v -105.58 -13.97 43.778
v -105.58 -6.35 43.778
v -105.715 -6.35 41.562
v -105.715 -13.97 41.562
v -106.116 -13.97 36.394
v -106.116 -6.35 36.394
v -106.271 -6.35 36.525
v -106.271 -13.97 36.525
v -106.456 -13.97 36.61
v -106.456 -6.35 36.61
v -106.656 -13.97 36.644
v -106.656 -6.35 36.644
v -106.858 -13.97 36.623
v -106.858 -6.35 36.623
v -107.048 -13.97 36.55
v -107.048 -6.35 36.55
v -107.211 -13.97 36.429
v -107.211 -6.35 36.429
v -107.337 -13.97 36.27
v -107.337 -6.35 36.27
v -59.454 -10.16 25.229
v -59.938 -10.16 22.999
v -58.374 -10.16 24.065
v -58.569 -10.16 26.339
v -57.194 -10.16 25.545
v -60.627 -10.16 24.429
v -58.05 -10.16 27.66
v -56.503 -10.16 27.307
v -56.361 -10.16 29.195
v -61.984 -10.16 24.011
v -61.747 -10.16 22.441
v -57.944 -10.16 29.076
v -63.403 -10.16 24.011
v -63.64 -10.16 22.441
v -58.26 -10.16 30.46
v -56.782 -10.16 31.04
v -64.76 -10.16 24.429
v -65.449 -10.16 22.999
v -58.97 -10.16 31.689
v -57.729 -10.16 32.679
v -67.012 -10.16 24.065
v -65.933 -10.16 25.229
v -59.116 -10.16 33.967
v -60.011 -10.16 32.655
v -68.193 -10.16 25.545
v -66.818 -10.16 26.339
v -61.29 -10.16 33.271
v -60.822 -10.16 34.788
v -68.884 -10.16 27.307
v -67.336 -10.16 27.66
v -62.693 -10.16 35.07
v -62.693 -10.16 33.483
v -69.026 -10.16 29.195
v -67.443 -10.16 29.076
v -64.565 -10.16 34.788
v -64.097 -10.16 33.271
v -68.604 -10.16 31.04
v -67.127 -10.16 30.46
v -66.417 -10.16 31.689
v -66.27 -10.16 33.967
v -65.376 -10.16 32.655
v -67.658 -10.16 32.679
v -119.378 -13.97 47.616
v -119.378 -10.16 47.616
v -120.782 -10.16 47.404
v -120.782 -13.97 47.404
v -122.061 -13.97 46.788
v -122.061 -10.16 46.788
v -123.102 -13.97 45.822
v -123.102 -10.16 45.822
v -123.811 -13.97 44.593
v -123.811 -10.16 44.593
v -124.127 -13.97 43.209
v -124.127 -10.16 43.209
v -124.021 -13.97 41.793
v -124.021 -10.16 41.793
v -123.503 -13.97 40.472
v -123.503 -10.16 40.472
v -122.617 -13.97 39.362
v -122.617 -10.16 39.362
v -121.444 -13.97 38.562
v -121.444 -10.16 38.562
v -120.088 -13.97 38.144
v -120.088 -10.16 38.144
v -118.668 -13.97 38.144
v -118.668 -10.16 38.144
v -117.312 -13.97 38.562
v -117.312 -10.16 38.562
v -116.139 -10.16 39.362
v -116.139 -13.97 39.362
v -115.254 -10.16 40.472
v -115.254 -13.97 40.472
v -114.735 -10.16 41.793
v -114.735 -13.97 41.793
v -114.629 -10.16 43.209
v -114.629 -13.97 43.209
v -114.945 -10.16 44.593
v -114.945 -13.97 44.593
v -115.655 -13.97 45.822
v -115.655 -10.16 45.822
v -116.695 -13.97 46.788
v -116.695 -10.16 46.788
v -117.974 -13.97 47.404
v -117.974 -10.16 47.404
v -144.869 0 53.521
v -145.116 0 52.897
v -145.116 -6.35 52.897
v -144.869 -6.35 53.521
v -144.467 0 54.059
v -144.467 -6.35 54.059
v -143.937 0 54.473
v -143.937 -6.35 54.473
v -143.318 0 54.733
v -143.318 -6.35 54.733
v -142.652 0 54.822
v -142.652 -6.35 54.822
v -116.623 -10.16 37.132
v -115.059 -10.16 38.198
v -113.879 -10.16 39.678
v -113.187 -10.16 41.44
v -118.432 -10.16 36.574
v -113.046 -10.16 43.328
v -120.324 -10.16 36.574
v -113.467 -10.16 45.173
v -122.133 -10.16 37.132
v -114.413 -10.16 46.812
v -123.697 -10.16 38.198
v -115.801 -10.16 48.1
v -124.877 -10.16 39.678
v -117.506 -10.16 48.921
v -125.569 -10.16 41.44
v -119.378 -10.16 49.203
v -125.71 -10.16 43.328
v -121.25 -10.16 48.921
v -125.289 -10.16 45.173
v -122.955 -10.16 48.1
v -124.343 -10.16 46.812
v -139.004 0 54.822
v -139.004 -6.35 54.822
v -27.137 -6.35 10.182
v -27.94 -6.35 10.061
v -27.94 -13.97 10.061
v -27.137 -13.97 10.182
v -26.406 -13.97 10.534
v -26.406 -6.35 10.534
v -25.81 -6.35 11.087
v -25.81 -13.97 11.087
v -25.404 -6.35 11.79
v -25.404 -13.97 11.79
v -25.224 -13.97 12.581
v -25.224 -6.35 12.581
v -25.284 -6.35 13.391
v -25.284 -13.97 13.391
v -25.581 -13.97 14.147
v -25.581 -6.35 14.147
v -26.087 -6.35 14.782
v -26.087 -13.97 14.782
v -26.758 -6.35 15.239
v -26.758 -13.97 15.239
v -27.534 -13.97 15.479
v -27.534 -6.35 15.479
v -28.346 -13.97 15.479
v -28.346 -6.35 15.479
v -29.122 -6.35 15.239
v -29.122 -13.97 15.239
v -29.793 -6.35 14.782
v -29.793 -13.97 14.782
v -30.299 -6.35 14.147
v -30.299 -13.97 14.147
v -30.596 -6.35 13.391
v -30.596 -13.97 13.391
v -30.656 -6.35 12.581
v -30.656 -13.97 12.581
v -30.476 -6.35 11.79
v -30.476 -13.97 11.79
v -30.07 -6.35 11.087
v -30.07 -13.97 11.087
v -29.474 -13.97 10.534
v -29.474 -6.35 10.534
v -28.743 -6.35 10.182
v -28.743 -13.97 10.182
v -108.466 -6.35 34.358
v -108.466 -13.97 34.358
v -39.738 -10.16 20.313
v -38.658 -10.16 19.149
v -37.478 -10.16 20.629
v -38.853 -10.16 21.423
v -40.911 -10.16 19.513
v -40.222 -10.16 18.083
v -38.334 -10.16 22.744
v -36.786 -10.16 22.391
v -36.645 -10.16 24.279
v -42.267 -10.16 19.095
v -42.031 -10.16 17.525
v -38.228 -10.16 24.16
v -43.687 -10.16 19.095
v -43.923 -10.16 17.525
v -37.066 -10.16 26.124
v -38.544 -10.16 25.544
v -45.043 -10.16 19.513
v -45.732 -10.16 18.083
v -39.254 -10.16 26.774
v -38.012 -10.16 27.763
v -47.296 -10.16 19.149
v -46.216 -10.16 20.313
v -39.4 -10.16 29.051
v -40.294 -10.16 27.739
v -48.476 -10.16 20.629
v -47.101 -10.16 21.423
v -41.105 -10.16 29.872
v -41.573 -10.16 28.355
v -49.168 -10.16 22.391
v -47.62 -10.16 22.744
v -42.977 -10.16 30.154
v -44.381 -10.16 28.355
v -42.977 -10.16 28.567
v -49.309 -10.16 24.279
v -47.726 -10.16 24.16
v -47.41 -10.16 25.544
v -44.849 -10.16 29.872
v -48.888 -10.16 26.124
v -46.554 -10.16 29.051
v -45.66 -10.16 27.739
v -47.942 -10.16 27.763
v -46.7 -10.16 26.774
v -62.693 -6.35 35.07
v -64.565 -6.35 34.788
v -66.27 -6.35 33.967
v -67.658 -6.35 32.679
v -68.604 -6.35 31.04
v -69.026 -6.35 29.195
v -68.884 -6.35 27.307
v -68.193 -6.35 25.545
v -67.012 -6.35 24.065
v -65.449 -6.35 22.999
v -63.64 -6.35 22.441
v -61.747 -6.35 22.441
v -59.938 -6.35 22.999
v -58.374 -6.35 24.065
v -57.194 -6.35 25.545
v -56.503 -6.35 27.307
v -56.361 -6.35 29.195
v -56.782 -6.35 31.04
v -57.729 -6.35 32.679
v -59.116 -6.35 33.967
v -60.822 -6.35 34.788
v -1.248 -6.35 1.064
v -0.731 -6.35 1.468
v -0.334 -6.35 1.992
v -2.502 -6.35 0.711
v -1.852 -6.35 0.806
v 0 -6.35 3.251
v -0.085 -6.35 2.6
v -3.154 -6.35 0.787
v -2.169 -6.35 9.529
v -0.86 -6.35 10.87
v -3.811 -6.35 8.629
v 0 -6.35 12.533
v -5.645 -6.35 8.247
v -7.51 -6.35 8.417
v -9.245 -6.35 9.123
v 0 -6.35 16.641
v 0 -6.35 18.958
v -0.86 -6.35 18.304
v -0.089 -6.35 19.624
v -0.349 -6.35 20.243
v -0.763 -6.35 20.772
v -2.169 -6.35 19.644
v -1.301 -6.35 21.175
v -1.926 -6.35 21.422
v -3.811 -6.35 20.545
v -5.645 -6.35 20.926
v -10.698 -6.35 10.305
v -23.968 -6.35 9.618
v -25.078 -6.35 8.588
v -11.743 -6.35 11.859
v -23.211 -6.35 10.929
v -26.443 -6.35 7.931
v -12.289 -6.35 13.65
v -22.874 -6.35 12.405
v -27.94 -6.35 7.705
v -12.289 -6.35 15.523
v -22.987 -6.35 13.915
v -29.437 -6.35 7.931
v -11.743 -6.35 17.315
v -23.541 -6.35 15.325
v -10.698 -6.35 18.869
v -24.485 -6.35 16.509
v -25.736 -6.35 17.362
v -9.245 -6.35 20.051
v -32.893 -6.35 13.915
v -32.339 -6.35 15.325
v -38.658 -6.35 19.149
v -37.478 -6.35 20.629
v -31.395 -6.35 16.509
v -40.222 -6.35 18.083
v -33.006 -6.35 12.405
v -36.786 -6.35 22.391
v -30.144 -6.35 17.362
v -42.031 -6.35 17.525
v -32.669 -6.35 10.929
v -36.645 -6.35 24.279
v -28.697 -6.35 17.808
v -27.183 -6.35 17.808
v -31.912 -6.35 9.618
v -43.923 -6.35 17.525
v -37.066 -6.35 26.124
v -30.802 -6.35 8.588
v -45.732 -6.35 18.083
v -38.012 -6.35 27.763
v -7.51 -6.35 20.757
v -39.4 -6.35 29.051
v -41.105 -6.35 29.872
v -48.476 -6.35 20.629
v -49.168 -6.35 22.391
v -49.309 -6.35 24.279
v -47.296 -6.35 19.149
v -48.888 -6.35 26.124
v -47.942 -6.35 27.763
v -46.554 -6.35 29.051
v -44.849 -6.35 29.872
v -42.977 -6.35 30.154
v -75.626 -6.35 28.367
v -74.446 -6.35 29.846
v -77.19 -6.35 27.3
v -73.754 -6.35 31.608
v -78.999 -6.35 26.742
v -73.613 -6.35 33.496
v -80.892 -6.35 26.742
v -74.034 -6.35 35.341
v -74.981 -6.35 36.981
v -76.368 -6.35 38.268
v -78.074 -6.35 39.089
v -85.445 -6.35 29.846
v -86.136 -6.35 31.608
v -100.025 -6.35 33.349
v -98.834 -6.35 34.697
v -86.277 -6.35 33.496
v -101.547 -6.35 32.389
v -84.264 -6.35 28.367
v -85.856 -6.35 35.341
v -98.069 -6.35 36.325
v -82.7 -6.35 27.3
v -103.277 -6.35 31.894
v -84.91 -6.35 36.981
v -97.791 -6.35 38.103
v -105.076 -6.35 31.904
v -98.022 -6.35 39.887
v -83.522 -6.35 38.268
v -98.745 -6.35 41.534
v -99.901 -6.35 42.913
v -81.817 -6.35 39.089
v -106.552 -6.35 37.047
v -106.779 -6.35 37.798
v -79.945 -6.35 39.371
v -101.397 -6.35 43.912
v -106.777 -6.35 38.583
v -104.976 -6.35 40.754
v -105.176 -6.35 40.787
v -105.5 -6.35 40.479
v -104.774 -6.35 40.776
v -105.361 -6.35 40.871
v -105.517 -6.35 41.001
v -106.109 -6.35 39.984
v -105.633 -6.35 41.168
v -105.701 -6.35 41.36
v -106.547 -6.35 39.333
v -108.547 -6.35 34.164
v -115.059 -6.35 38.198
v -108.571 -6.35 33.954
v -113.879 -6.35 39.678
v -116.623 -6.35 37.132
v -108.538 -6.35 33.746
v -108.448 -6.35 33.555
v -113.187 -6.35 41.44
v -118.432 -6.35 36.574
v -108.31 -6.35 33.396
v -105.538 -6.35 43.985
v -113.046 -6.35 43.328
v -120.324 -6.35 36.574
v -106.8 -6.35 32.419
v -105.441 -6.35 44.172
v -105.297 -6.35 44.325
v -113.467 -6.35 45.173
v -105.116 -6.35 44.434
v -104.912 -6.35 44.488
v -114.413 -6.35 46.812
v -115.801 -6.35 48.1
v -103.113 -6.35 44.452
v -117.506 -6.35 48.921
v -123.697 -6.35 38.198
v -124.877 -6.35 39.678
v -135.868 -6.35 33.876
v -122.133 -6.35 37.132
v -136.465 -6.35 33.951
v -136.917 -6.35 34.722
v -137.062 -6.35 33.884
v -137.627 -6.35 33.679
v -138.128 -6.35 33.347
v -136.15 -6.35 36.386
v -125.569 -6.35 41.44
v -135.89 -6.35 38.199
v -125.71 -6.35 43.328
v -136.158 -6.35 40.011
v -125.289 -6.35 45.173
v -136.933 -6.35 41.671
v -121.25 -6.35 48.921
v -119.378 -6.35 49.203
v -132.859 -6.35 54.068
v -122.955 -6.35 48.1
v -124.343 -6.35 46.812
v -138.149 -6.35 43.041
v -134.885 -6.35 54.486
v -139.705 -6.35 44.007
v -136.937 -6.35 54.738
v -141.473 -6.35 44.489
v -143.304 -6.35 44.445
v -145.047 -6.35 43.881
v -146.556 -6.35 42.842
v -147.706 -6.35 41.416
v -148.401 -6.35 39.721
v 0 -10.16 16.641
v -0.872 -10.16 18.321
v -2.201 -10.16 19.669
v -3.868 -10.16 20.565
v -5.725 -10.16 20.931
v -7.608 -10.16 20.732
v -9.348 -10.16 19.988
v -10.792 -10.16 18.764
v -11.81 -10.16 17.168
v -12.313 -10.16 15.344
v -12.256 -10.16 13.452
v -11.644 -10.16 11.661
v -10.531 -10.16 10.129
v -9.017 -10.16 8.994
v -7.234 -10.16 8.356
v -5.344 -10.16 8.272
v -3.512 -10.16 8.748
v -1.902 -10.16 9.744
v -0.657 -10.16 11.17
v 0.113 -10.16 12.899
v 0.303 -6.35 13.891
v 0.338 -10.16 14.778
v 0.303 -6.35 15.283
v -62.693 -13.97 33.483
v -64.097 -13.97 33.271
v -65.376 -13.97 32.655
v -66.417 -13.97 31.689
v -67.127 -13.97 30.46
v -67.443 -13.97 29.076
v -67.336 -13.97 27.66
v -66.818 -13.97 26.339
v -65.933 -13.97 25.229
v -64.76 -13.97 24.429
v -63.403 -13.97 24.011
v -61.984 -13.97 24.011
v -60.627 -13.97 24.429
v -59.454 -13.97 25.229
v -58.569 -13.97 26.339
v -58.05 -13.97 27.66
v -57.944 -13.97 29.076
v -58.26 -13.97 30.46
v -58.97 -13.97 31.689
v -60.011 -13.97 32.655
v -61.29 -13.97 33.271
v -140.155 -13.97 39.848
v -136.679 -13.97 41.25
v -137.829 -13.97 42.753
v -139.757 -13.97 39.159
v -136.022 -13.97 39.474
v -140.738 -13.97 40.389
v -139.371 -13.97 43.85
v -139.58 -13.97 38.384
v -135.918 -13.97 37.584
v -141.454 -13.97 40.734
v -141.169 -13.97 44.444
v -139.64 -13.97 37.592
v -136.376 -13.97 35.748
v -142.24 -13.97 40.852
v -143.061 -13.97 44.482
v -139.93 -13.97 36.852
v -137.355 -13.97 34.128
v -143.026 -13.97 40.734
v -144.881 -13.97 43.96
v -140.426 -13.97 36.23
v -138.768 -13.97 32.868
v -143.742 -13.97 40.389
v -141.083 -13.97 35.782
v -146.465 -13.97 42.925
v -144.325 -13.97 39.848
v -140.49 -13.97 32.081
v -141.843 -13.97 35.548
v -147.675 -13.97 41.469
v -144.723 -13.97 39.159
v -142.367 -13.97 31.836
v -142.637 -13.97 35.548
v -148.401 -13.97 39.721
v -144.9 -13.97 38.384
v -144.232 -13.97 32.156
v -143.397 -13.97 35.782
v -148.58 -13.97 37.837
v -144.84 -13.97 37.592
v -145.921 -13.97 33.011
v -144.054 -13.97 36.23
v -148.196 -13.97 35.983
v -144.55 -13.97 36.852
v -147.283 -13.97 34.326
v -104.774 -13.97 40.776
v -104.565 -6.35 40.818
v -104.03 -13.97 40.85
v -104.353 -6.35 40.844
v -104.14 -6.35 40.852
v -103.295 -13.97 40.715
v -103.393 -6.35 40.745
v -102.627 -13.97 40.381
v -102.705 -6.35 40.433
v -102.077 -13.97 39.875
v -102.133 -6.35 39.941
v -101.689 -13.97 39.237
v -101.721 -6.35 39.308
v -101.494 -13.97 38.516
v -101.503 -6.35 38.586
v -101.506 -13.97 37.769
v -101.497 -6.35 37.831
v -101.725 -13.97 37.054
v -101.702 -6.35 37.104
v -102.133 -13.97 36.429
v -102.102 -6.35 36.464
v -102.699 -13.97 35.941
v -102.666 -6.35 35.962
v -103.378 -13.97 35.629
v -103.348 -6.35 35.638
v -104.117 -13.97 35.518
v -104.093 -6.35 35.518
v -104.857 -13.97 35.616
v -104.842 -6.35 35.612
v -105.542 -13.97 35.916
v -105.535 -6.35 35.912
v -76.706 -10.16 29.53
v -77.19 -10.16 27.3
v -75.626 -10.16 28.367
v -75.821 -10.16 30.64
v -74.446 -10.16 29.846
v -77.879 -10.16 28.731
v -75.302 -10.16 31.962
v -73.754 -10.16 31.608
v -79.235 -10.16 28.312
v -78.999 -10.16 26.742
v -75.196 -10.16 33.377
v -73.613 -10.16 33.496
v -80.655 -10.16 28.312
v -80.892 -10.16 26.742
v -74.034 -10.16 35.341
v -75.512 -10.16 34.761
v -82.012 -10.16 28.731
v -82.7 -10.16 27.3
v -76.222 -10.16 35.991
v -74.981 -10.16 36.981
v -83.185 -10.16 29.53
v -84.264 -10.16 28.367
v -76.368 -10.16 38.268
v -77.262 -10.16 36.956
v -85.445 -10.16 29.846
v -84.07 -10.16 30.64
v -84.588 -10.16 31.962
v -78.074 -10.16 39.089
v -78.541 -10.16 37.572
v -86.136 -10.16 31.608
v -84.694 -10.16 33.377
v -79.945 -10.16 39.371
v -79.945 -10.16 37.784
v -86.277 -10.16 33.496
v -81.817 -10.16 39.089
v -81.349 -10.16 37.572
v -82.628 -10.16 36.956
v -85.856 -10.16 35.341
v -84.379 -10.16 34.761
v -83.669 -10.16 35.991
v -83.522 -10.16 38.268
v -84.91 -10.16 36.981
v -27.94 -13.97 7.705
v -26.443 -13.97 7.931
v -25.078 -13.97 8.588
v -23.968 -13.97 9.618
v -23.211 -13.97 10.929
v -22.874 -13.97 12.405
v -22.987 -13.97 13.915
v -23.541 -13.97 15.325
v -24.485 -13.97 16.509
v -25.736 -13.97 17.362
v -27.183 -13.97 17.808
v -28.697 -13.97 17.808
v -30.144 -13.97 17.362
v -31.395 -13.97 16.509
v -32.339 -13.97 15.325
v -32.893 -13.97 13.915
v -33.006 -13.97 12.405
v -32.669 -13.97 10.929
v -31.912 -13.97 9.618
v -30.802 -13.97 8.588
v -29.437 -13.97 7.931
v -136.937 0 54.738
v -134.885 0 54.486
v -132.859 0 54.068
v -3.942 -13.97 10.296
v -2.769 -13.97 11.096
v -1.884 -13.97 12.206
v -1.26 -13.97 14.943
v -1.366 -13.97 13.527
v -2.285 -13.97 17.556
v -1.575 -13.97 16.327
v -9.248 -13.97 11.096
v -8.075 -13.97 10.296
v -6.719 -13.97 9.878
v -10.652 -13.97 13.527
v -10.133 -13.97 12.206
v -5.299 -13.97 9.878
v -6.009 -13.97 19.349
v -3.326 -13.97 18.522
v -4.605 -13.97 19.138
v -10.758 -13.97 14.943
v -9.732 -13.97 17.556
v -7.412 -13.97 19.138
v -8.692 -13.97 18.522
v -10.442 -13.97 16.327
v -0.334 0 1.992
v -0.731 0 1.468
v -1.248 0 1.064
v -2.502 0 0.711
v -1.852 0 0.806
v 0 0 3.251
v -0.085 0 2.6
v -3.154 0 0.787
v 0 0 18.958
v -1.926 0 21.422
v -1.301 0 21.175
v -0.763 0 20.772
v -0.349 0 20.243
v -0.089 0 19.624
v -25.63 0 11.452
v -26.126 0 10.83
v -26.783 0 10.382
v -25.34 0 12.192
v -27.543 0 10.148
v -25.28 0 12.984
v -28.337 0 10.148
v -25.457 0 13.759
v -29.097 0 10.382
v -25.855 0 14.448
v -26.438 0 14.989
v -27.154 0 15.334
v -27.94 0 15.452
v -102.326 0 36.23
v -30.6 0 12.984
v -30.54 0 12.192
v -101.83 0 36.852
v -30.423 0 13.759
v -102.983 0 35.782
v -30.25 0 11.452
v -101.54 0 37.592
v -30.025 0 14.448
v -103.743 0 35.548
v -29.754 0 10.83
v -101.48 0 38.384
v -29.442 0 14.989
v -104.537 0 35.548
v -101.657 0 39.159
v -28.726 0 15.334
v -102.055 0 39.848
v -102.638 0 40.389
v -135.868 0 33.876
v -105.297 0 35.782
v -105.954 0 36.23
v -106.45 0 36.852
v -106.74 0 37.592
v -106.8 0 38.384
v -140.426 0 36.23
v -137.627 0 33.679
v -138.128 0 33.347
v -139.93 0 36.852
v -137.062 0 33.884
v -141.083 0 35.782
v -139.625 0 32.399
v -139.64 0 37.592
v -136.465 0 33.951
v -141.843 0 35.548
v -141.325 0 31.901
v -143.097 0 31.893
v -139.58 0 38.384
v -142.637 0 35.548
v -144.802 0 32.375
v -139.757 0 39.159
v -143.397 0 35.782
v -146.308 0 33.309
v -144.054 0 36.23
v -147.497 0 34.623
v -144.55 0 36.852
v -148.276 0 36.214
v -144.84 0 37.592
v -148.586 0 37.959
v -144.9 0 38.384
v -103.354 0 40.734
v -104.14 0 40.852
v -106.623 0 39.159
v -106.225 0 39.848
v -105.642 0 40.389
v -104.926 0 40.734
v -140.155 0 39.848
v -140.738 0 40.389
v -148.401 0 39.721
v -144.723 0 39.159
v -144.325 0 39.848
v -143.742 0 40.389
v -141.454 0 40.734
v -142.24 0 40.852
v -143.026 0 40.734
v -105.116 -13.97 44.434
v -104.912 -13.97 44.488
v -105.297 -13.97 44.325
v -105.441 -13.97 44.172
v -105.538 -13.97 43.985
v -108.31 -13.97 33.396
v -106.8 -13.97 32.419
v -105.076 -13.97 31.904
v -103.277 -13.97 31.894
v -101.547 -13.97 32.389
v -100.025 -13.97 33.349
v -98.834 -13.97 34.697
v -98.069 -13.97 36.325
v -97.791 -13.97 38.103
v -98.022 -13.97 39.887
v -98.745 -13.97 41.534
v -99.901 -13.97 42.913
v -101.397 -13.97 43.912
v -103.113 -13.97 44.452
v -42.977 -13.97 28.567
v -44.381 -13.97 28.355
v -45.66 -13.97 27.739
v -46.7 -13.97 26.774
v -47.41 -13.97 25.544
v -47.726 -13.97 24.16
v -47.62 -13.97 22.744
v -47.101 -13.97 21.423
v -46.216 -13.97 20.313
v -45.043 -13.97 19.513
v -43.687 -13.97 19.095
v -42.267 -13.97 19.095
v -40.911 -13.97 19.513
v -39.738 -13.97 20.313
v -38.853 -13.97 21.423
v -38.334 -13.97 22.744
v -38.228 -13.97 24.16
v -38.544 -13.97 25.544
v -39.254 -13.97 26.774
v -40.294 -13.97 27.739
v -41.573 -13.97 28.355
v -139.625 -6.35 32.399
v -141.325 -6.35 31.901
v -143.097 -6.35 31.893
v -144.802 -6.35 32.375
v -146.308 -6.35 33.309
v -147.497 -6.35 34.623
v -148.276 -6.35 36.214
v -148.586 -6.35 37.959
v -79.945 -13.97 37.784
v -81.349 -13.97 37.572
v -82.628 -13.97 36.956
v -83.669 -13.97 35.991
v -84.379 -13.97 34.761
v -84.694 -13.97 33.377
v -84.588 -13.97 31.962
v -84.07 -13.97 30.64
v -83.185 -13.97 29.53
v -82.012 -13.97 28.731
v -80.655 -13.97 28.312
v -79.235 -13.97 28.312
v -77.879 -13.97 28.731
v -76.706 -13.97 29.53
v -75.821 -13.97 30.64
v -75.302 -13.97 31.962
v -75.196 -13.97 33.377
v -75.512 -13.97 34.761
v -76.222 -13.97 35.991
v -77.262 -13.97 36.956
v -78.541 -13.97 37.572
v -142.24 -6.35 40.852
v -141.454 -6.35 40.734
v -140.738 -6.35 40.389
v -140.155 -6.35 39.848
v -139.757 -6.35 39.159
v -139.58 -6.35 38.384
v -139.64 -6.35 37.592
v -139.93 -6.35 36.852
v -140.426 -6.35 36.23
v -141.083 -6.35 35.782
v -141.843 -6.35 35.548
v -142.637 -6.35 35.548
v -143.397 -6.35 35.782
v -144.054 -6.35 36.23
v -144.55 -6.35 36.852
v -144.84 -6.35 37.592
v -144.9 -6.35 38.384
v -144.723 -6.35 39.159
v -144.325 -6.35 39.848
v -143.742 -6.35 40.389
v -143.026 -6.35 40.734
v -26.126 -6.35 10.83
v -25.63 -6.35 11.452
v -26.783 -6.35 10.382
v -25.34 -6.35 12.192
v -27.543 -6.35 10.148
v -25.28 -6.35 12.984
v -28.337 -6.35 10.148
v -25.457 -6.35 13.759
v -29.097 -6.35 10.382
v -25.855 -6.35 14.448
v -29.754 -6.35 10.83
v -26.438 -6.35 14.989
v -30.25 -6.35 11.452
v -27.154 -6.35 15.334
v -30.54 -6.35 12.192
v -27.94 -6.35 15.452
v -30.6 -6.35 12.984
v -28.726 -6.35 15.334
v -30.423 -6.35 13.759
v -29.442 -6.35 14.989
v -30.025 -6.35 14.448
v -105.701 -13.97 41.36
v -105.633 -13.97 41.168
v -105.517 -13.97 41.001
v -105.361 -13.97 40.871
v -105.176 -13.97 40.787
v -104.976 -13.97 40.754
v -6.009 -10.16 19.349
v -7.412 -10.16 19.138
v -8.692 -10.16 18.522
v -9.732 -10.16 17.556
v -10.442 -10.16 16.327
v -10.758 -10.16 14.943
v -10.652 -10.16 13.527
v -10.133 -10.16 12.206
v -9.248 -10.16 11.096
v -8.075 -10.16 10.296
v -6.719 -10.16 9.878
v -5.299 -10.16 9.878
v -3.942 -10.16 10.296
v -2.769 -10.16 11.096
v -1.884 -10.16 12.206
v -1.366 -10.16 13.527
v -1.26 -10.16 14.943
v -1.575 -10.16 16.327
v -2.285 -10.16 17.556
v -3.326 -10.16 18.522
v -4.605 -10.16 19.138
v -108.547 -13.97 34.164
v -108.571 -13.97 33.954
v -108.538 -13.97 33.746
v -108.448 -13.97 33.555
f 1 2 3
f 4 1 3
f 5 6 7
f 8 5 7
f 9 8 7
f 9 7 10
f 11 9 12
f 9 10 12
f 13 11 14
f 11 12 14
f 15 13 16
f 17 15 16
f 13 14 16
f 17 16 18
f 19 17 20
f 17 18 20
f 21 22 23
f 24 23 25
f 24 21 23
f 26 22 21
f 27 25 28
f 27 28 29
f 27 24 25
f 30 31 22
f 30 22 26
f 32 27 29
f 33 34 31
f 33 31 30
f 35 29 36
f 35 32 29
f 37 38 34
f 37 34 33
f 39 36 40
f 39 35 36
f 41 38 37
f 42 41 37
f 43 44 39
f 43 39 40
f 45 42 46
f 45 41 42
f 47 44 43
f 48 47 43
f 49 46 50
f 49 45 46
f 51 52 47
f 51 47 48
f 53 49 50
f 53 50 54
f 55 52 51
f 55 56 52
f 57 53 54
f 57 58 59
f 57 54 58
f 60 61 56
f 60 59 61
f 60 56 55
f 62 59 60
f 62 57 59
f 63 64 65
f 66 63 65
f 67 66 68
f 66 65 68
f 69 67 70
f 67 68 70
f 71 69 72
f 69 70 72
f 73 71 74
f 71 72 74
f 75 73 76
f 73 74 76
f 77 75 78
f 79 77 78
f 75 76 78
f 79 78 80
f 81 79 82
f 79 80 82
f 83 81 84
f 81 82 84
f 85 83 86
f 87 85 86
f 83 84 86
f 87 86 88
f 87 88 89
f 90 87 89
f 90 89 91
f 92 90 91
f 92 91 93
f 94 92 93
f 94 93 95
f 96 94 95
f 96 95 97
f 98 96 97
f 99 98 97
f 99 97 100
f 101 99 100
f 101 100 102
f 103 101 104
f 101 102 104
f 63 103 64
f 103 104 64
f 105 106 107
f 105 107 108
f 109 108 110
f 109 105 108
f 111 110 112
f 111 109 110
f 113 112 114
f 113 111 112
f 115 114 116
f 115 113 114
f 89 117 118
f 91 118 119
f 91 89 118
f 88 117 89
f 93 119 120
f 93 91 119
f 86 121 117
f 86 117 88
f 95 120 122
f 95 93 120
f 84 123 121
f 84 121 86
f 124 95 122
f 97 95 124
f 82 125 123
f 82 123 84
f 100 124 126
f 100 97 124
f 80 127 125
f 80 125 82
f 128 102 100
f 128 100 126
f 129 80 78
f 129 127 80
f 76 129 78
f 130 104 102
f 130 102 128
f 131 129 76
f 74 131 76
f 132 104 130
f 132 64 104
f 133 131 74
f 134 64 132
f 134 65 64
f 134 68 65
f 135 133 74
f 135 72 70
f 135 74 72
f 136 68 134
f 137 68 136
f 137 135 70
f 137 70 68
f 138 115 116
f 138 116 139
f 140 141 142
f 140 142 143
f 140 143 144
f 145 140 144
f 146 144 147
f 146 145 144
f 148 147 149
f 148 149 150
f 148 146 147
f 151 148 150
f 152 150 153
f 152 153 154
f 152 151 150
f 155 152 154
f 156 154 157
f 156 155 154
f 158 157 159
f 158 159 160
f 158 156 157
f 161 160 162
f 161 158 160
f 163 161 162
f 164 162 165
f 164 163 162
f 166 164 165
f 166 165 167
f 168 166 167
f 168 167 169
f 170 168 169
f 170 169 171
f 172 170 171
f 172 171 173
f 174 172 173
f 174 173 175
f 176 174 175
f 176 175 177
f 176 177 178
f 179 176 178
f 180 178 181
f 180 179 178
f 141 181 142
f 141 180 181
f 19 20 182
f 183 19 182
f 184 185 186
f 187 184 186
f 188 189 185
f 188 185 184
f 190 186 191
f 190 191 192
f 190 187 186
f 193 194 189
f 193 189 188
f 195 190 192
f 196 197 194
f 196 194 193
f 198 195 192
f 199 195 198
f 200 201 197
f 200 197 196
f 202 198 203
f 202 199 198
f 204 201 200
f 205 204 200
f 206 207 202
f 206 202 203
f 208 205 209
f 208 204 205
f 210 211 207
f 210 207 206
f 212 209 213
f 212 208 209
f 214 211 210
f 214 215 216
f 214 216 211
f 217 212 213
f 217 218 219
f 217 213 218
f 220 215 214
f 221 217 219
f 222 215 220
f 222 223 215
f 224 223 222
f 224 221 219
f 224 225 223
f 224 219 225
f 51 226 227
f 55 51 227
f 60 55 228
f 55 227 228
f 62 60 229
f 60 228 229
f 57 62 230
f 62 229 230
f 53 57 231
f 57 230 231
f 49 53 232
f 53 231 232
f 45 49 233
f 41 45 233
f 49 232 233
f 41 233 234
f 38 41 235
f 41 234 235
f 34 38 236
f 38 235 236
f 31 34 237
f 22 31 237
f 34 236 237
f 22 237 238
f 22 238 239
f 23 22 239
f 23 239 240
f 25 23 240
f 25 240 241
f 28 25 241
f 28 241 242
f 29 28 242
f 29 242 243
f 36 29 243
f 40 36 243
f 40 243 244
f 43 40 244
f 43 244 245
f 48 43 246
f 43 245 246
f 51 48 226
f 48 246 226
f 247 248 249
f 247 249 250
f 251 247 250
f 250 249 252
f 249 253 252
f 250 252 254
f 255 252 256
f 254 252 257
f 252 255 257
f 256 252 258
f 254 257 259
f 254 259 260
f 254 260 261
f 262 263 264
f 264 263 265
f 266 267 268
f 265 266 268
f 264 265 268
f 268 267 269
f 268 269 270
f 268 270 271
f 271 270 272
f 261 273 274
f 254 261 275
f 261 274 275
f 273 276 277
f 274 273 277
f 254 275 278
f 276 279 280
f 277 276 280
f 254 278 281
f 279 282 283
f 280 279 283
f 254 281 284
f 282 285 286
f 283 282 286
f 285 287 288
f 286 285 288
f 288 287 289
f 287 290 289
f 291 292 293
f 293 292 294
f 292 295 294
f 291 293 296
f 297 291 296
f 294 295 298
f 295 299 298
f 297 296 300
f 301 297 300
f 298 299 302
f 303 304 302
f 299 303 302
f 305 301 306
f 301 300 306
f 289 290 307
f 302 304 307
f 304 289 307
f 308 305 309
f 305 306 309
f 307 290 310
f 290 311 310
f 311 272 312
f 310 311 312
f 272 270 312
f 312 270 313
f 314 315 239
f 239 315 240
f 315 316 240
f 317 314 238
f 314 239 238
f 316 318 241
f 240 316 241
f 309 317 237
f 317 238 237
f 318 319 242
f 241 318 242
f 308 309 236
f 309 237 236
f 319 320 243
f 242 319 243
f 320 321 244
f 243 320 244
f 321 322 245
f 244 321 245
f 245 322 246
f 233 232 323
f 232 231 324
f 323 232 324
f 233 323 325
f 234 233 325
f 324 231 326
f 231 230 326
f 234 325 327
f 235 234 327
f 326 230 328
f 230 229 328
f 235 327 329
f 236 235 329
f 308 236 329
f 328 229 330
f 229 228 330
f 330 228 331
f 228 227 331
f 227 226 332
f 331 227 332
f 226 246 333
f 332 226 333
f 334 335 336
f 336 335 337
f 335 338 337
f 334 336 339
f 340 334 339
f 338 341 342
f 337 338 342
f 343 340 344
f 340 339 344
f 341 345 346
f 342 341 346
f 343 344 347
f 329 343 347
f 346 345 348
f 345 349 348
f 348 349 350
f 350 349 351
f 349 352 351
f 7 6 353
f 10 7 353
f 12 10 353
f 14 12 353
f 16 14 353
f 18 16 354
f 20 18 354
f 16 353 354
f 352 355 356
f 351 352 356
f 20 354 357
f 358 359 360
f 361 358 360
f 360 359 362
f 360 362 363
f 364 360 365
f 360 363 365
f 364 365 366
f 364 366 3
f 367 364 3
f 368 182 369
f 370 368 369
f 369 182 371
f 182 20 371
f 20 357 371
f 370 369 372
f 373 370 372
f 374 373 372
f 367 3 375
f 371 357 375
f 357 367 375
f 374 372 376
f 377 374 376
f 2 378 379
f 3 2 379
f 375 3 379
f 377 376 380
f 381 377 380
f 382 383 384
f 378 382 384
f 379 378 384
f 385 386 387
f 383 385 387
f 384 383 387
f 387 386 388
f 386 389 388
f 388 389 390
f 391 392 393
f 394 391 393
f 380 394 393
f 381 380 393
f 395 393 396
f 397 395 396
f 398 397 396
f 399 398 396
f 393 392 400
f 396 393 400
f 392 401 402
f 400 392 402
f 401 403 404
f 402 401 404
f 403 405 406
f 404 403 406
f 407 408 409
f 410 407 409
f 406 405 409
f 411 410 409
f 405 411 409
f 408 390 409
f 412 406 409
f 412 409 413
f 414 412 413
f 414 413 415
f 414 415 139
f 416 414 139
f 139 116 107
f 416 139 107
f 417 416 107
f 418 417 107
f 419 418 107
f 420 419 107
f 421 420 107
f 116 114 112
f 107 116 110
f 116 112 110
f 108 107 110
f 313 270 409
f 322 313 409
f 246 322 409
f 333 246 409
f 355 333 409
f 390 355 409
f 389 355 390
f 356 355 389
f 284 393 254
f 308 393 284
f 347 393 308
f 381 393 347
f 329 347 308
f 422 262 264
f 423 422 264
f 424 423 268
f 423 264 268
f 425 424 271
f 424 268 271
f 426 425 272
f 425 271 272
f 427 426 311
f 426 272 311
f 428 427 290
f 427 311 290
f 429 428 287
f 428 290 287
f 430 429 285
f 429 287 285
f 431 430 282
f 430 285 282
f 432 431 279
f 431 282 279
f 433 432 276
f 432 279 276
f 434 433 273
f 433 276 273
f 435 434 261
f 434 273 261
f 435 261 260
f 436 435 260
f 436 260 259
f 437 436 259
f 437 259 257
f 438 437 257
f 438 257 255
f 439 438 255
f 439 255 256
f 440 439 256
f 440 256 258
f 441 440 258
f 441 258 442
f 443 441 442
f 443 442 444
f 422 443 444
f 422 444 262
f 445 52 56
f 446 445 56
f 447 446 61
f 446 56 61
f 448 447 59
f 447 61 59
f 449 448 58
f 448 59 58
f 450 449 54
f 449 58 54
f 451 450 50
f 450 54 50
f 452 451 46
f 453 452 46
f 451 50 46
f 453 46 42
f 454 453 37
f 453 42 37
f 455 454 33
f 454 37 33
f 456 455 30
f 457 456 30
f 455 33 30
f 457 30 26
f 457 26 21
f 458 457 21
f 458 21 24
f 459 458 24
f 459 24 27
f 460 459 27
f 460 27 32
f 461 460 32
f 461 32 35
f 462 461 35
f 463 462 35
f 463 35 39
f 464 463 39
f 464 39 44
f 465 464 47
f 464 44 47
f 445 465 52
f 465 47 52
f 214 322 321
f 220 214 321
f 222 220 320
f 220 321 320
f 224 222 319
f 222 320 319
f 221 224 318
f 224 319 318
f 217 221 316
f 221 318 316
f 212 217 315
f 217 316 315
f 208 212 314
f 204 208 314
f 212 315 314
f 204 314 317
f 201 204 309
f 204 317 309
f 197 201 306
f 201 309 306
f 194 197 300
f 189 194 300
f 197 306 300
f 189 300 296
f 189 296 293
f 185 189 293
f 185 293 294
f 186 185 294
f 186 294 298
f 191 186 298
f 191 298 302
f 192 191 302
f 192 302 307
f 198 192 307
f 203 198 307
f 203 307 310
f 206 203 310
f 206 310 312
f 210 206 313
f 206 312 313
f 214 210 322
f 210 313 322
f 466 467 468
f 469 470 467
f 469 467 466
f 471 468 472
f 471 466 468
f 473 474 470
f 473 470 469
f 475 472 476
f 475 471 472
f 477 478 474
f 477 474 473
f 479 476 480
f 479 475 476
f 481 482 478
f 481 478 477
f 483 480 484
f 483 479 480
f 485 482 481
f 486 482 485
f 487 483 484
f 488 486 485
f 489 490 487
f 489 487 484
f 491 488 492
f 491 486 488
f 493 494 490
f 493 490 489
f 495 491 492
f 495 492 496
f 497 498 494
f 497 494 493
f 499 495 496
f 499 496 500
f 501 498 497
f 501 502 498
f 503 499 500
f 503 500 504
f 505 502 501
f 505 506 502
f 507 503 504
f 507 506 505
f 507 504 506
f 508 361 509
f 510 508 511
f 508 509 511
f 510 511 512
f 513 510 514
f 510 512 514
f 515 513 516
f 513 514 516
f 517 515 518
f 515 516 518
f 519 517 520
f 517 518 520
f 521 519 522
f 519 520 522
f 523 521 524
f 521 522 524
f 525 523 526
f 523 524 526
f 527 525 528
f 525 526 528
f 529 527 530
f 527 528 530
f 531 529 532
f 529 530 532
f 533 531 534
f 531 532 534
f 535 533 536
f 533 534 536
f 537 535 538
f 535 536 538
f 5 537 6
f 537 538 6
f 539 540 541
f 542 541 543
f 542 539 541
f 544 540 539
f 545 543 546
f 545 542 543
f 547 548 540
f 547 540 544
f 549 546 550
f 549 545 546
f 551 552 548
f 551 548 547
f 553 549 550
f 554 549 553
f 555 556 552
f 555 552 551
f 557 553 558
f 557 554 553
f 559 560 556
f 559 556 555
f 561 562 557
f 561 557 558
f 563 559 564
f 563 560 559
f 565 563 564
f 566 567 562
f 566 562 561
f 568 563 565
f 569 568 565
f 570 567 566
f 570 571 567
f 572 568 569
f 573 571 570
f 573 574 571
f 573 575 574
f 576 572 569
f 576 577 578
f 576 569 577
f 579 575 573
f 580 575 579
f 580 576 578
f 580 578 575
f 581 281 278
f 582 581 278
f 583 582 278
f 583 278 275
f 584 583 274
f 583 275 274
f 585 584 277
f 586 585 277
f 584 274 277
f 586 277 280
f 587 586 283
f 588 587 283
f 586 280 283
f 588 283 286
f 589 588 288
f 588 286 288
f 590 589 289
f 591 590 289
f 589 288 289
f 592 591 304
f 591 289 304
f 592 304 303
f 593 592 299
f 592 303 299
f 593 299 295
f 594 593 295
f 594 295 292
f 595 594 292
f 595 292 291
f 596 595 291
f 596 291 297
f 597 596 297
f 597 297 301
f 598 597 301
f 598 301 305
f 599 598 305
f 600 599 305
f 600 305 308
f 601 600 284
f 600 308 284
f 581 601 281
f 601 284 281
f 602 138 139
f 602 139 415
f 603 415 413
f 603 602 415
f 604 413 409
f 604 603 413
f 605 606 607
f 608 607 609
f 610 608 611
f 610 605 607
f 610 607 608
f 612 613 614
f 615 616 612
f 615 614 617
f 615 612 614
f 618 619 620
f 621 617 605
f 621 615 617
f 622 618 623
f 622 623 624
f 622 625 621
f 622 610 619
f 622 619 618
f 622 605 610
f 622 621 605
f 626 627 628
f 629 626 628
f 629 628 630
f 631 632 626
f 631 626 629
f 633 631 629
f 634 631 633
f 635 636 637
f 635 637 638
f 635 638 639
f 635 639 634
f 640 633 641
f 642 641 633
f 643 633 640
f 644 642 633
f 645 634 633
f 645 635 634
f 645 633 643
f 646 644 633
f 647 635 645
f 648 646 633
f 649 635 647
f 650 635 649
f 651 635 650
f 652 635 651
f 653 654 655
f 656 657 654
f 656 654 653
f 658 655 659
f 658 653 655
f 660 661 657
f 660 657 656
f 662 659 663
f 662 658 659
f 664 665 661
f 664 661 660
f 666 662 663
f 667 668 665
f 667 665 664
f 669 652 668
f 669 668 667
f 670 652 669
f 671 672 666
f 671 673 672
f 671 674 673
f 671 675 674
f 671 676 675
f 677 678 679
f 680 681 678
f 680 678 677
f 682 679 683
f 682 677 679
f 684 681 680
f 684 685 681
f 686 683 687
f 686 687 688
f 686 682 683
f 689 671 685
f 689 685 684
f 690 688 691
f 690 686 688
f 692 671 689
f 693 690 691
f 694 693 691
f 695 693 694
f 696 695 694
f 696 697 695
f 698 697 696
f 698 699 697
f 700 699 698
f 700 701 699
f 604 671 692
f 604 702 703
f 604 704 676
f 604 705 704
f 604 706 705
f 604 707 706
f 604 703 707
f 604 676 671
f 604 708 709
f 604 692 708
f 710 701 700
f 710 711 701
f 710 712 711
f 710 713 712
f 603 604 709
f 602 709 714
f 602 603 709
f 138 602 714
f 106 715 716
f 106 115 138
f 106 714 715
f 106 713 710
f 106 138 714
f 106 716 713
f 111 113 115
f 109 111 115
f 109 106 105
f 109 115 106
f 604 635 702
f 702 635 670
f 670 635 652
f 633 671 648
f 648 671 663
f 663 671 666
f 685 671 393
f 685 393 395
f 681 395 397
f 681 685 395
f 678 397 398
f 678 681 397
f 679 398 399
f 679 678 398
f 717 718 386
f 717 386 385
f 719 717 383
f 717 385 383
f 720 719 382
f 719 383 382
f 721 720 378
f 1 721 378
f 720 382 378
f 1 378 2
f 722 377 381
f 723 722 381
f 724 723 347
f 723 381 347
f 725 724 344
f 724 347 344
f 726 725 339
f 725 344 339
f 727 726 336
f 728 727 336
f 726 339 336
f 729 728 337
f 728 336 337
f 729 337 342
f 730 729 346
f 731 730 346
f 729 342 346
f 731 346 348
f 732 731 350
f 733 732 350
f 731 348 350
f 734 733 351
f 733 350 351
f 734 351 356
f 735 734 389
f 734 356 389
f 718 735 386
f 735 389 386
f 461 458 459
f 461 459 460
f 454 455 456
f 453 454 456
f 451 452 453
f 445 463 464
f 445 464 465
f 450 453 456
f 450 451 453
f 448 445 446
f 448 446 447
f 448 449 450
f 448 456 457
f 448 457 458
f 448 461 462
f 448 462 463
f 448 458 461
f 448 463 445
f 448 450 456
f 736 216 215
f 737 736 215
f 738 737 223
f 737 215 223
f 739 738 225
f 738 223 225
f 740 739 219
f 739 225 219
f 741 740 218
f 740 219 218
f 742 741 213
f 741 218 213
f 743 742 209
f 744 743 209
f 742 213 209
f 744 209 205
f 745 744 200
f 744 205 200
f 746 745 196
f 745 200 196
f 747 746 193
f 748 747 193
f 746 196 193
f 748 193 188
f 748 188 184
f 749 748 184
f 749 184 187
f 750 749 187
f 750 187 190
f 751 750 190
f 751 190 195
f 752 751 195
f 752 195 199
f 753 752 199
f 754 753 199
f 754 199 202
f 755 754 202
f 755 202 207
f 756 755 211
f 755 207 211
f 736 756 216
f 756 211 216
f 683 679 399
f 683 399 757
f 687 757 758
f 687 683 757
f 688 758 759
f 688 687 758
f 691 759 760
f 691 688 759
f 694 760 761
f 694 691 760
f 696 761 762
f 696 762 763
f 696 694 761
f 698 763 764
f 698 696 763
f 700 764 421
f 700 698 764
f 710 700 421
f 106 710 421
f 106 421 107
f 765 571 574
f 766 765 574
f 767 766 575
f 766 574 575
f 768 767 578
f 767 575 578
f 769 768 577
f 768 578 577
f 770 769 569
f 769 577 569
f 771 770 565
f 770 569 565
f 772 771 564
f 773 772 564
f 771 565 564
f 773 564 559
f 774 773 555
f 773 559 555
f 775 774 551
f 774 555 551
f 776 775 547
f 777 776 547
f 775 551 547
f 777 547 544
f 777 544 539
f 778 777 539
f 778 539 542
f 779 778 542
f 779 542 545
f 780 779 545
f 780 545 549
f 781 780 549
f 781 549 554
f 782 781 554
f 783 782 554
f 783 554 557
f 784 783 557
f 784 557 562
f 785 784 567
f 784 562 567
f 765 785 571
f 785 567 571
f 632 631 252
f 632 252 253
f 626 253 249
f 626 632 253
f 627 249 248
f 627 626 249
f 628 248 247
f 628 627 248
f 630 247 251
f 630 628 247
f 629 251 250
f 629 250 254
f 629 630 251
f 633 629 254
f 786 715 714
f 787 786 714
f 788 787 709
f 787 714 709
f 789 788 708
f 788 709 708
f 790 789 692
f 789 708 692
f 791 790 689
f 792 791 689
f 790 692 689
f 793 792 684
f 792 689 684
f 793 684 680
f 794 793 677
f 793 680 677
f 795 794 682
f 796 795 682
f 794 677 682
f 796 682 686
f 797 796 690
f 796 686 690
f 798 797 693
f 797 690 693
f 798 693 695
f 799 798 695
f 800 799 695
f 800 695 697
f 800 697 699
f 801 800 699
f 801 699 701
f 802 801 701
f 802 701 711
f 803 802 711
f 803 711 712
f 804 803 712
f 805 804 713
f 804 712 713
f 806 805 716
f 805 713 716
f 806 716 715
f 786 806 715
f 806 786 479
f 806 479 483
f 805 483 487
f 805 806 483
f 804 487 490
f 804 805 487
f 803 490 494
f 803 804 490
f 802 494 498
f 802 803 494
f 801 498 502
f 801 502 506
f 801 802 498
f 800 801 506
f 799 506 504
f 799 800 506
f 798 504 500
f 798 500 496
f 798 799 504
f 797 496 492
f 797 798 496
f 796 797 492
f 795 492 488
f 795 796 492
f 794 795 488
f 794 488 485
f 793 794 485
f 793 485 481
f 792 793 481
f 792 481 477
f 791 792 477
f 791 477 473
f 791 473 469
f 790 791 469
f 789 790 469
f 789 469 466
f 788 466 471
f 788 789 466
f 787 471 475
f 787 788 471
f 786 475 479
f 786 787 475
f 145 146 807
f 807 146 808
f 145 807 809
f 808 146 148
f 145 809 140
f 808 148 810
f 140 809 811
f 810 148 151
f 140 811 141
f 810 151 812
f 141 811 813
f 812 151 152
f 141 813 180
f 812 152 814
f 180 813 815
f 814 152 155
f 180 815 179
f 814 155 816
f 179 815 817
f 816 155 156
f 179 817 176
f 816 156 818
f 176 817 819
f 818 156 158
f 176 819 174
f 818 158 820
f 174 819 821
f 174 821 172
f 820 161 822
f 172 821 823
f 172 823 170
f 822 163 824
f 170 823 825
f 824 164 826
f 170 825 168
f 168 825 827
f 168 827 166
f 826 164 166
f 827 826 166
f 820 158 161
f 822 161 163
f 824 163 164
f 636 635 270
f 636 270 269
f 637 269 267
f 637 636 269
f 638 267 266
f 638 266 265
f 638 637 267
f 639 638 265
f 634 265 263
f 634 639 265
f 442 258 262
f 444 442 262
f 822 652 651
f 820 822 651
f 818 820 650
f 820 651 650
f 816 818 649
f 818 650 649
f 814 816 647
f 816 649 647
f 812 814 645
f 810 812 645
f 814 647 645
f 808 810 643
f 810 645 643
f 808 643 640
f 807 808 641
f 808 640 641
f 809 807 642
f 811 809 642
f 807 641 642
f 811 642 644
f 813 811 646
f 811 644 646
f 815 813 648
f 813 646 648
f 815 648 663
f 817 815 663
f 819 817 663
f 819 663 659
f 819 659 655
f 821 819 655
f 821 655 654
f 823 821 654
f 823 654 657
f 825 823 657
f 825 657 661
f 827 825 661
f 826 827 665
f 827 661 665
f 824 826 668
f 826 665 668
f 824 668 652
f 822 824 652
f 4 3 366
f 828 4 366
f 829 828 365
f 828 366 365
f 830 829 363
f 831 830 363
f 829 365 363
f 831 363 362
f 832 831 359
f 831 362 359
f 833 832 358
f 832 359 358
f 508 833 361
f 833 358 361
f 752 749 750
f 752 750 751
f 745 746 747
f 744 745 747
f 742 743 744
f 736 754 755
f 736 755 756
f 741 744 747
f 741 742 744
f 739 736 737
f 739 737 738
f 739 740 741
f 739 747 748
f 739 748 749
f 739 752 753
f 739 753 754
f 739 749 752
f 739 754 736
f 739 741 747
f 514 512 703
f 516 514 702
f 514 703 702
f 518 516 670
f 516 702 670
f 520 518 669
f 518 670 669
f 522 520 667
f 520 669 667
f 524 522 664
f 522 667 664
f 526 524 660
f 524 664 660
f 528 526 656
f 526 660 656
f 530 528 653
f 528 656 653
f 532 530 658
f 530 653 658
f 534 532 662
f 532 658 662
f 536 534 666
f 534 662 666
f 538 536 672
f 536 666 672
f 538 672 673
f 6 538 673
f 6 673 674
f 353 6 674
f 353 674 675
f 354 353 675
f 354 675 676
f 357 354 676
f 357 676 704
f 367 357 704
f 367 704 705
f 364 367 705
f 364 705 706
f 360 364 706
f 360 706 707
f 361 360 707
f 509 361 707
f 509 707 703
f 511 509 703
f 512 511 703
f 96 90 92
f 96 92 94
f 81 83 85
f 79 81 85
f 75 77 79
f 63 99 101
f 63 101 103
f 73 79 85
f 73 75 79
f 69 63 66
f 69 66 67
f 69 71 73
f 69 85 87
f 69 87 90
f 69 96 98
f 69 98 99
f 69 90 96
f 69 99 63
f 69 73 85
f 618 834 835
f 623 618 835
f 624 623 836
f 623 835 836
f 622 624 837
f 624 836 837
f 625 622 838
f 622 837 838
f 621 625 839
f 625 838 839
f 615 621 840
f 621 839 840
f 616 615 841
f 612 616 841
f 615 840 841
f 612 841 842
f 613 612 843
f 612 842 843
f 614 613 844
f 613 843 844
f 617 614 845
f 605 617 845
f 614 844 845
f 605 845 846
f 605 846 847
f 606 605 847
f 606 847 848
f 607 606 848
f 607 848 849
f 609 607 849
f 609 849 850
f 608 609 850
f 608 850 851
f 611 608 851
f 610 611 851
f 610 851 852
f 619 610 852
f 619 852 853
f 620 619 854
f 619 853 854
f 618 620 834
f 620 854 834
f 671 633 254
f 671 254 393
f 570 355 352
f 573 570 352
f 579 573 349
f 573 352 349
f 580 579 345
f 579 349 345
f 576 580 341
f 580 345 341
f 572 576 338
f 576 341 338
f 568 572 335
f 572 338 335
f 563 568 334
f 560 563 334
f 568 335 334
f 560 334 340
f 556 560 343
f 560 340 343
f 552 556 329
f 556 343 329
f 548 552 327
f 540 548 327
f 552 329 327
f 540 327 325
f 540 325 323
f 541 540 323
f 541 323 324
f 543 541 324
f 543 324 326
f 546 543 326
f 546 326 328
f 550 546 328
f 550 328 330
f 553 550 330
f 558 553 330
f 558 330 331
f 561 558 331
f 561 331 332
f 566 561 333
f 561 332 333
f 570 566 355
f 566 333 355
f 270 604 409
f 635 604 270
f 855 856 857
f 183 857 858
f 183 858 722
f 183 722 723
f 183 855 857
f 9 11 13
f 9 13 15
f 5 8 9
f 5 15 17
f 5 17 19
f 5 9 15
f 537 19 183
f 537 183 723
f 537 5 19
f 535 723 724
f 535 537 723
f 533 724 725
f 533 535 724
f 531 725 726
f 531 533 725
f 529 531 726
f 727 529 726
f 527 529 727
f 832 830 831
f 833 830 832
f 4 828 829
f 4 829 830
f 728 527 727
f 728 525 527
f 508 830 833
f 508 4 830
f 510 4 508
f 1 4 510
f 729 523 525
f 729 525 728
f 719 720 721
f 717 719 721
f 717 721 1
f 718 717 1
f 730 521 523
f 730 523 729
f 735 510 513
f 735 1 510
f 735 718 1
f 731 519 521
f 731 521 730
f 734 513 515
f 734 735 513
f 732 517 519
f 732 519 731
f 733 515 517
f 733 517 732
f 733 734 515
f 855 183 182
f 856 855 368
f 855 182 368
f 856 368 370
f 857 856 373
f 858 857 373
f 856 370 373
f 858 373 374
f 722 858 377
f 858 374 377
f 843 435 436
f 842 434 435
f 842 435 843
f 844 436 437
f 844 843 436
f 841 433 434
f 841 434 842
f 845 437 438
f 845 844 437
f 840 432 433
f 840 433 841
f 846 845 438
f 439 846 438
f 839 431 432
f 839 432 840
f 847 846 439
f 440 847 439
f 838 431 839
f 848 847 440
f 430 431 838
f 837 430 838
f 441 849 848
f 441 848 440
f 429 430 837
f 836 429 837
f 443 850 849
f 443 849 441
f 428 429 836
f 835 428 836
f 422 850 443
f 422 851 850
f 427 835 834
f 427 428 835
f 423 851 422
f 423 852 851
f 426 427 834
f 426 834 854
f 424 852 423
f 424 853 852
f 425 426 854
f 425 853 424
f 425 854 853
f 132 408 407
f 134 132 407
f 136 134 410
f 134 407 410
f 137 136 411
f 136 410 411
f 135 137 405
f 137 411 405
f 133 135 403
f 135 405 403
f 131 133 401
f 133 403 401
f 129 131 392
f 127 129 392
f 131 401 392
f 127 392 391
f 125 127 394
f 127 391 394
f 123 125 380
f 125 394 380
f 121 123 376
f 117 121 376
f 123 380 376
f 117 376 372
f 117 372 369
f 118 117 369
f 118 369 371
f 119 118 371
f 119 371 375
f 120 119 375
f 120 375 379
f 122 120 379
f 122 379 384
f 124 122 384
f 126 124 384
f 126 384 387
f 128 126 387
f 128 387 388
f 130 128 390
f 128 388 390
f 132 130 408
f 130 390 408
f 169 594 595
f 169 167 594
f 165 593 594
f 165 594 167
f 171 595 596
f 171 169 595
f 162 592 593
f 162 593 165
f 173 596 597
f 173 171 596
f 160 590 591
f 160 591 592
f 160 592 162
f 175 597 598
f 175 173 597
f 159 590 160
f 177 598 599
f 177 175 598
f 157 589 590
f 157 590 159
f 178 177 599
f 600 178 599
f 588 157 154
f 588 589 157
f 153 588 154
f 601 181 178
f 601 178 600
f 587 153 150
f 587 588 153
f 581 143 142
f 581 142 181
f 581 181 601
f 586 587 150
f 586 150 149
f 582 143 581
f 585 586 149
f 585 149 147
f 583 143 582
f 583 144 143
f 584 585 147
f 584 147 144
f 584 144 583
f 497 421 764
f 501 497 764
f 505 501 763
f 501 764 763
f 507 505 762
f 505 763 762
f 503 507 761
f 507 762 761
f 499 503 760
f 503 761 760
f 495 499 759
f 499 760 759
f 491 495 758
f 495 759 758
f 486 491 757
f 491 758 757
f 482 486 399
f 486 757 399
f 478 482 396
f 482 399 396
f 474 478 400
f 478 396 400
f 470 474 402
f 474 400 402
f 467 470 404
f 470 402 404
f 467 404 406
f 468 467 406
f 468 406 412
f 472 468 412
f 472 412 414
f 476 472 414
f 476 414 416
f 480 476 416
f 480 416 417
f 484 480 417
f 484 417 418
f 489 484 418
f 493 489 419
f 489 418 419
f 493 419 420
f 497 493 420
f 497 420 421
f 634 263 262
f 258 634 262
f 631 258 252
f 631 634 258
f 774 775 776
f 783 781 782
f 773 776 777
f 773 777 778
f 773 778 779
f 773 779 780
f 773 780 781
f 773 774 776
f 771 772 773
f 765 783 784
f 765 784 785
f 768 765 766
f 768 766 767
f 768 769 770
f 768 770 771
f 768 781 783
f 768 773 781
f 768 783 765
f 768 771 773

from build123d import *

# Parameters (mm, degrees)
SKETCH1_R           = 2.667
BOSS_EXTRUDE1_DEPTH = 6.35
SKETCH3_R           = 6.35
BOSS_EXTRUDE2_DEPTH = 3.81
SKETCH4_R           = 4.7625
BOSS_EXTRUDE3_DEPTH = 3.81
SKETCH5_R           = 6.35
SKETCH5_R_2         = 2.667
SKETCH5_R_3         = 5.08
SKETCH5_R_4         = 2.723974981
BOSS_EXTRUDE4_DEPTH = 7.62


with BuildPart() as part:
    # Sketch1 → Boss-Extrude1 (new body)
    with BuildSketch(Plane(origin=(0, 0, 0), x_dir=(-1, 0, 0), z_dir=(0, 1, 0))):
        with BuildLine():
            Line((132.859114436, 54.06756661), (1.925518385, 21.422154602))
            ThreePointArc((1.925518385, 21.422154602), (0.538452686, 20.521383604), (0, 18.957603457))
            Line((0, 18.957603457), (0, 3.251051746))
            ThreePointArc((0, 3.251051746), (0.976219853, 1.249504432), (3.154481615, 0.786500601))
            Line((3.154481615, 0.786500601), (135.868185597, 33.875743365))
            ThreePointArc((135.868185597, 33.875743365), (137.061865325, 33.884273202), (138.127619437, 33.346581632))
            ThreePointArc((138.127619437, 33.346581632), (145.587943549, 32.789337046), (148.401377862, 39.7212592))
            Line((148.401377862, 39.7212592), (145.116412217, 52.896536778))
            ThreePointArc((145.116412217, 52.896536778), (144.215641219, 54.283602477), (142.651861072, 54.822055163))
            Line((142.651861072, 54.822055163), (139.003930584, 54.822055163))
            ThreePointArc((139.003930584, 54.822055163), (135.908449262, 54.632727414), (132.859114436, 54.06756661))
        make_face()
        with Locations(Location((142.24, 38.185055163, 0), (0, 0, 90))):
            Circle(SKETCH1_R, mode=Mode.SUBTRACT)
        with Locations(Location((27.94, 12.785055202, 0), (0, 0, 90))):
            Circle(SKETCH1_R, mode=Mode.SUBTRACT)
        with Locations(Location((104.14, 38.185055202, 0), (0, 0, 90))):
            Circle(SKETCH1_R, mode=Mode.SUBTRACT)
    extrude(amount=-BOSS_EXTRUDE1_DEPTH)

    # Sketch3 → Boss-Extrude2 (add)
    with BuildSketch(Plane(origin=(0, -6.35, 0), x_dir=(-1, 0, 0), z_dir=(0, -1, 0))):
        with Locations(Location((6.00871488, -14.586933973, 0), (0, 0, 198.870092131))):
            Circle(SKETCH3_R)
        with Locations(Location((42.976982051, -23.804158196, 0), (0, 0, 270))):
            Circle(SKETCH3_R)
        with Locations(Location((79.945249222, -33.021382418, 0), (0, 0, 270))):
            Circle(SKETCH3_R)
        with Locations(Location((119.378067538, -42.853088255, 0), (0, 0, 270))):
            Circle(SKETCH3_R)
        with Locations(Location((62.693391209, -28.720011114, 0), (0, 0, 270))):
            Circle(SKETCH3_R)
    extrude(amount=BOSS_EXTRUDE2_DEPTH)

    # Sketch4 → Boss-Extrude3 (add)
    with BuildSketch(Plane.XZ.offset(10.16)):
        with Locations(Location((-6.00871488, 14.586933973, 0), (0, 0, 90))):
            Circle(SKETCH4_R)
        with Locations(Location((-42.976982051, 23.804158196, 0), (0, 0, 90))):
            Circle(SKETCH4_R)
        with Locations(Location((-62.693391209, 28.720011114, 0), (0, 0, 90))):
            Circle(SKETCH4_R)
        with Locations(Location((-79.945249222, 33.021382418, 0), (0, 0, 90))):
            Circle(SKETCH4_R)
        with Locations(Location((-119.378067538, 42.853088255, 0), (0, 0, 90))):
            Circle(SKETCH4_R)
    extrude(amount=BOSS_EXTRUDE3_DEPTH)

    # Sketch5 → Boss-Extrude4 (add)
    with BuildSketch(Plane.XZ.offset(6.35)):
        with Locations(Location((-142.24, 38.185055163, 0), (0, 0, 166))):
            Circle(SKETCH5_R)
        with Locations(Location((-142.24, 38.185055163, 0), (0, 0, 90))):
            Circle(SKETCH5_R_2, mode=Mode.SUBTRACT)
        with Locations(Location((-27.94, 12.785055202, 0), (0, 0, 270))):
            Circle(SKETCH5_R_3)
        with Locations(Location((-27.94, 12.785055202, 0), (0, 0, 270))):
            Circle(SKETCH5_R_4, mode=Mode.SUBTRACT)
        with BuildLine():
            Line((-105.580163175, 43.777970545), (-105.715311414, 41.562252701))
            ThreePointArc((-105.715311414, 41.562252701), (-105.443232026, 40.931048752), (-104.773674962, 40.775681582))
            ThreePointArc((-104.773674962, 40.775681582), (-101.589970205, 37.403878498), (-106.115998075, 36.393876649))
            ThreePointArc((-106.115998075, 36.393876649), (-106.757692083, 36.64019843), (-107.336634242, 36.269696613))
            Line((-107.336634242, 36.269696613), (-108.465736097, 34.358466745))
            ThreePointArc((-108.465736097, 34.358466745), (-108.561892576, 33.849199875), (-108.310080465, 33.396221428))
            ThreePointArc((-108.310080465, 33.396221428), (-98.068500487, 36.325110669), (-104.912246263, 44.487922463))
            ThreePointArc((-104.912246263, 44.487922463), (-105.374571656, 44.25371306), (-105.580163175, 43.777970545))
        make_face()
    extrude(amount=BOSS_EXTRUDE4_DEPTH)


solid = part.part
